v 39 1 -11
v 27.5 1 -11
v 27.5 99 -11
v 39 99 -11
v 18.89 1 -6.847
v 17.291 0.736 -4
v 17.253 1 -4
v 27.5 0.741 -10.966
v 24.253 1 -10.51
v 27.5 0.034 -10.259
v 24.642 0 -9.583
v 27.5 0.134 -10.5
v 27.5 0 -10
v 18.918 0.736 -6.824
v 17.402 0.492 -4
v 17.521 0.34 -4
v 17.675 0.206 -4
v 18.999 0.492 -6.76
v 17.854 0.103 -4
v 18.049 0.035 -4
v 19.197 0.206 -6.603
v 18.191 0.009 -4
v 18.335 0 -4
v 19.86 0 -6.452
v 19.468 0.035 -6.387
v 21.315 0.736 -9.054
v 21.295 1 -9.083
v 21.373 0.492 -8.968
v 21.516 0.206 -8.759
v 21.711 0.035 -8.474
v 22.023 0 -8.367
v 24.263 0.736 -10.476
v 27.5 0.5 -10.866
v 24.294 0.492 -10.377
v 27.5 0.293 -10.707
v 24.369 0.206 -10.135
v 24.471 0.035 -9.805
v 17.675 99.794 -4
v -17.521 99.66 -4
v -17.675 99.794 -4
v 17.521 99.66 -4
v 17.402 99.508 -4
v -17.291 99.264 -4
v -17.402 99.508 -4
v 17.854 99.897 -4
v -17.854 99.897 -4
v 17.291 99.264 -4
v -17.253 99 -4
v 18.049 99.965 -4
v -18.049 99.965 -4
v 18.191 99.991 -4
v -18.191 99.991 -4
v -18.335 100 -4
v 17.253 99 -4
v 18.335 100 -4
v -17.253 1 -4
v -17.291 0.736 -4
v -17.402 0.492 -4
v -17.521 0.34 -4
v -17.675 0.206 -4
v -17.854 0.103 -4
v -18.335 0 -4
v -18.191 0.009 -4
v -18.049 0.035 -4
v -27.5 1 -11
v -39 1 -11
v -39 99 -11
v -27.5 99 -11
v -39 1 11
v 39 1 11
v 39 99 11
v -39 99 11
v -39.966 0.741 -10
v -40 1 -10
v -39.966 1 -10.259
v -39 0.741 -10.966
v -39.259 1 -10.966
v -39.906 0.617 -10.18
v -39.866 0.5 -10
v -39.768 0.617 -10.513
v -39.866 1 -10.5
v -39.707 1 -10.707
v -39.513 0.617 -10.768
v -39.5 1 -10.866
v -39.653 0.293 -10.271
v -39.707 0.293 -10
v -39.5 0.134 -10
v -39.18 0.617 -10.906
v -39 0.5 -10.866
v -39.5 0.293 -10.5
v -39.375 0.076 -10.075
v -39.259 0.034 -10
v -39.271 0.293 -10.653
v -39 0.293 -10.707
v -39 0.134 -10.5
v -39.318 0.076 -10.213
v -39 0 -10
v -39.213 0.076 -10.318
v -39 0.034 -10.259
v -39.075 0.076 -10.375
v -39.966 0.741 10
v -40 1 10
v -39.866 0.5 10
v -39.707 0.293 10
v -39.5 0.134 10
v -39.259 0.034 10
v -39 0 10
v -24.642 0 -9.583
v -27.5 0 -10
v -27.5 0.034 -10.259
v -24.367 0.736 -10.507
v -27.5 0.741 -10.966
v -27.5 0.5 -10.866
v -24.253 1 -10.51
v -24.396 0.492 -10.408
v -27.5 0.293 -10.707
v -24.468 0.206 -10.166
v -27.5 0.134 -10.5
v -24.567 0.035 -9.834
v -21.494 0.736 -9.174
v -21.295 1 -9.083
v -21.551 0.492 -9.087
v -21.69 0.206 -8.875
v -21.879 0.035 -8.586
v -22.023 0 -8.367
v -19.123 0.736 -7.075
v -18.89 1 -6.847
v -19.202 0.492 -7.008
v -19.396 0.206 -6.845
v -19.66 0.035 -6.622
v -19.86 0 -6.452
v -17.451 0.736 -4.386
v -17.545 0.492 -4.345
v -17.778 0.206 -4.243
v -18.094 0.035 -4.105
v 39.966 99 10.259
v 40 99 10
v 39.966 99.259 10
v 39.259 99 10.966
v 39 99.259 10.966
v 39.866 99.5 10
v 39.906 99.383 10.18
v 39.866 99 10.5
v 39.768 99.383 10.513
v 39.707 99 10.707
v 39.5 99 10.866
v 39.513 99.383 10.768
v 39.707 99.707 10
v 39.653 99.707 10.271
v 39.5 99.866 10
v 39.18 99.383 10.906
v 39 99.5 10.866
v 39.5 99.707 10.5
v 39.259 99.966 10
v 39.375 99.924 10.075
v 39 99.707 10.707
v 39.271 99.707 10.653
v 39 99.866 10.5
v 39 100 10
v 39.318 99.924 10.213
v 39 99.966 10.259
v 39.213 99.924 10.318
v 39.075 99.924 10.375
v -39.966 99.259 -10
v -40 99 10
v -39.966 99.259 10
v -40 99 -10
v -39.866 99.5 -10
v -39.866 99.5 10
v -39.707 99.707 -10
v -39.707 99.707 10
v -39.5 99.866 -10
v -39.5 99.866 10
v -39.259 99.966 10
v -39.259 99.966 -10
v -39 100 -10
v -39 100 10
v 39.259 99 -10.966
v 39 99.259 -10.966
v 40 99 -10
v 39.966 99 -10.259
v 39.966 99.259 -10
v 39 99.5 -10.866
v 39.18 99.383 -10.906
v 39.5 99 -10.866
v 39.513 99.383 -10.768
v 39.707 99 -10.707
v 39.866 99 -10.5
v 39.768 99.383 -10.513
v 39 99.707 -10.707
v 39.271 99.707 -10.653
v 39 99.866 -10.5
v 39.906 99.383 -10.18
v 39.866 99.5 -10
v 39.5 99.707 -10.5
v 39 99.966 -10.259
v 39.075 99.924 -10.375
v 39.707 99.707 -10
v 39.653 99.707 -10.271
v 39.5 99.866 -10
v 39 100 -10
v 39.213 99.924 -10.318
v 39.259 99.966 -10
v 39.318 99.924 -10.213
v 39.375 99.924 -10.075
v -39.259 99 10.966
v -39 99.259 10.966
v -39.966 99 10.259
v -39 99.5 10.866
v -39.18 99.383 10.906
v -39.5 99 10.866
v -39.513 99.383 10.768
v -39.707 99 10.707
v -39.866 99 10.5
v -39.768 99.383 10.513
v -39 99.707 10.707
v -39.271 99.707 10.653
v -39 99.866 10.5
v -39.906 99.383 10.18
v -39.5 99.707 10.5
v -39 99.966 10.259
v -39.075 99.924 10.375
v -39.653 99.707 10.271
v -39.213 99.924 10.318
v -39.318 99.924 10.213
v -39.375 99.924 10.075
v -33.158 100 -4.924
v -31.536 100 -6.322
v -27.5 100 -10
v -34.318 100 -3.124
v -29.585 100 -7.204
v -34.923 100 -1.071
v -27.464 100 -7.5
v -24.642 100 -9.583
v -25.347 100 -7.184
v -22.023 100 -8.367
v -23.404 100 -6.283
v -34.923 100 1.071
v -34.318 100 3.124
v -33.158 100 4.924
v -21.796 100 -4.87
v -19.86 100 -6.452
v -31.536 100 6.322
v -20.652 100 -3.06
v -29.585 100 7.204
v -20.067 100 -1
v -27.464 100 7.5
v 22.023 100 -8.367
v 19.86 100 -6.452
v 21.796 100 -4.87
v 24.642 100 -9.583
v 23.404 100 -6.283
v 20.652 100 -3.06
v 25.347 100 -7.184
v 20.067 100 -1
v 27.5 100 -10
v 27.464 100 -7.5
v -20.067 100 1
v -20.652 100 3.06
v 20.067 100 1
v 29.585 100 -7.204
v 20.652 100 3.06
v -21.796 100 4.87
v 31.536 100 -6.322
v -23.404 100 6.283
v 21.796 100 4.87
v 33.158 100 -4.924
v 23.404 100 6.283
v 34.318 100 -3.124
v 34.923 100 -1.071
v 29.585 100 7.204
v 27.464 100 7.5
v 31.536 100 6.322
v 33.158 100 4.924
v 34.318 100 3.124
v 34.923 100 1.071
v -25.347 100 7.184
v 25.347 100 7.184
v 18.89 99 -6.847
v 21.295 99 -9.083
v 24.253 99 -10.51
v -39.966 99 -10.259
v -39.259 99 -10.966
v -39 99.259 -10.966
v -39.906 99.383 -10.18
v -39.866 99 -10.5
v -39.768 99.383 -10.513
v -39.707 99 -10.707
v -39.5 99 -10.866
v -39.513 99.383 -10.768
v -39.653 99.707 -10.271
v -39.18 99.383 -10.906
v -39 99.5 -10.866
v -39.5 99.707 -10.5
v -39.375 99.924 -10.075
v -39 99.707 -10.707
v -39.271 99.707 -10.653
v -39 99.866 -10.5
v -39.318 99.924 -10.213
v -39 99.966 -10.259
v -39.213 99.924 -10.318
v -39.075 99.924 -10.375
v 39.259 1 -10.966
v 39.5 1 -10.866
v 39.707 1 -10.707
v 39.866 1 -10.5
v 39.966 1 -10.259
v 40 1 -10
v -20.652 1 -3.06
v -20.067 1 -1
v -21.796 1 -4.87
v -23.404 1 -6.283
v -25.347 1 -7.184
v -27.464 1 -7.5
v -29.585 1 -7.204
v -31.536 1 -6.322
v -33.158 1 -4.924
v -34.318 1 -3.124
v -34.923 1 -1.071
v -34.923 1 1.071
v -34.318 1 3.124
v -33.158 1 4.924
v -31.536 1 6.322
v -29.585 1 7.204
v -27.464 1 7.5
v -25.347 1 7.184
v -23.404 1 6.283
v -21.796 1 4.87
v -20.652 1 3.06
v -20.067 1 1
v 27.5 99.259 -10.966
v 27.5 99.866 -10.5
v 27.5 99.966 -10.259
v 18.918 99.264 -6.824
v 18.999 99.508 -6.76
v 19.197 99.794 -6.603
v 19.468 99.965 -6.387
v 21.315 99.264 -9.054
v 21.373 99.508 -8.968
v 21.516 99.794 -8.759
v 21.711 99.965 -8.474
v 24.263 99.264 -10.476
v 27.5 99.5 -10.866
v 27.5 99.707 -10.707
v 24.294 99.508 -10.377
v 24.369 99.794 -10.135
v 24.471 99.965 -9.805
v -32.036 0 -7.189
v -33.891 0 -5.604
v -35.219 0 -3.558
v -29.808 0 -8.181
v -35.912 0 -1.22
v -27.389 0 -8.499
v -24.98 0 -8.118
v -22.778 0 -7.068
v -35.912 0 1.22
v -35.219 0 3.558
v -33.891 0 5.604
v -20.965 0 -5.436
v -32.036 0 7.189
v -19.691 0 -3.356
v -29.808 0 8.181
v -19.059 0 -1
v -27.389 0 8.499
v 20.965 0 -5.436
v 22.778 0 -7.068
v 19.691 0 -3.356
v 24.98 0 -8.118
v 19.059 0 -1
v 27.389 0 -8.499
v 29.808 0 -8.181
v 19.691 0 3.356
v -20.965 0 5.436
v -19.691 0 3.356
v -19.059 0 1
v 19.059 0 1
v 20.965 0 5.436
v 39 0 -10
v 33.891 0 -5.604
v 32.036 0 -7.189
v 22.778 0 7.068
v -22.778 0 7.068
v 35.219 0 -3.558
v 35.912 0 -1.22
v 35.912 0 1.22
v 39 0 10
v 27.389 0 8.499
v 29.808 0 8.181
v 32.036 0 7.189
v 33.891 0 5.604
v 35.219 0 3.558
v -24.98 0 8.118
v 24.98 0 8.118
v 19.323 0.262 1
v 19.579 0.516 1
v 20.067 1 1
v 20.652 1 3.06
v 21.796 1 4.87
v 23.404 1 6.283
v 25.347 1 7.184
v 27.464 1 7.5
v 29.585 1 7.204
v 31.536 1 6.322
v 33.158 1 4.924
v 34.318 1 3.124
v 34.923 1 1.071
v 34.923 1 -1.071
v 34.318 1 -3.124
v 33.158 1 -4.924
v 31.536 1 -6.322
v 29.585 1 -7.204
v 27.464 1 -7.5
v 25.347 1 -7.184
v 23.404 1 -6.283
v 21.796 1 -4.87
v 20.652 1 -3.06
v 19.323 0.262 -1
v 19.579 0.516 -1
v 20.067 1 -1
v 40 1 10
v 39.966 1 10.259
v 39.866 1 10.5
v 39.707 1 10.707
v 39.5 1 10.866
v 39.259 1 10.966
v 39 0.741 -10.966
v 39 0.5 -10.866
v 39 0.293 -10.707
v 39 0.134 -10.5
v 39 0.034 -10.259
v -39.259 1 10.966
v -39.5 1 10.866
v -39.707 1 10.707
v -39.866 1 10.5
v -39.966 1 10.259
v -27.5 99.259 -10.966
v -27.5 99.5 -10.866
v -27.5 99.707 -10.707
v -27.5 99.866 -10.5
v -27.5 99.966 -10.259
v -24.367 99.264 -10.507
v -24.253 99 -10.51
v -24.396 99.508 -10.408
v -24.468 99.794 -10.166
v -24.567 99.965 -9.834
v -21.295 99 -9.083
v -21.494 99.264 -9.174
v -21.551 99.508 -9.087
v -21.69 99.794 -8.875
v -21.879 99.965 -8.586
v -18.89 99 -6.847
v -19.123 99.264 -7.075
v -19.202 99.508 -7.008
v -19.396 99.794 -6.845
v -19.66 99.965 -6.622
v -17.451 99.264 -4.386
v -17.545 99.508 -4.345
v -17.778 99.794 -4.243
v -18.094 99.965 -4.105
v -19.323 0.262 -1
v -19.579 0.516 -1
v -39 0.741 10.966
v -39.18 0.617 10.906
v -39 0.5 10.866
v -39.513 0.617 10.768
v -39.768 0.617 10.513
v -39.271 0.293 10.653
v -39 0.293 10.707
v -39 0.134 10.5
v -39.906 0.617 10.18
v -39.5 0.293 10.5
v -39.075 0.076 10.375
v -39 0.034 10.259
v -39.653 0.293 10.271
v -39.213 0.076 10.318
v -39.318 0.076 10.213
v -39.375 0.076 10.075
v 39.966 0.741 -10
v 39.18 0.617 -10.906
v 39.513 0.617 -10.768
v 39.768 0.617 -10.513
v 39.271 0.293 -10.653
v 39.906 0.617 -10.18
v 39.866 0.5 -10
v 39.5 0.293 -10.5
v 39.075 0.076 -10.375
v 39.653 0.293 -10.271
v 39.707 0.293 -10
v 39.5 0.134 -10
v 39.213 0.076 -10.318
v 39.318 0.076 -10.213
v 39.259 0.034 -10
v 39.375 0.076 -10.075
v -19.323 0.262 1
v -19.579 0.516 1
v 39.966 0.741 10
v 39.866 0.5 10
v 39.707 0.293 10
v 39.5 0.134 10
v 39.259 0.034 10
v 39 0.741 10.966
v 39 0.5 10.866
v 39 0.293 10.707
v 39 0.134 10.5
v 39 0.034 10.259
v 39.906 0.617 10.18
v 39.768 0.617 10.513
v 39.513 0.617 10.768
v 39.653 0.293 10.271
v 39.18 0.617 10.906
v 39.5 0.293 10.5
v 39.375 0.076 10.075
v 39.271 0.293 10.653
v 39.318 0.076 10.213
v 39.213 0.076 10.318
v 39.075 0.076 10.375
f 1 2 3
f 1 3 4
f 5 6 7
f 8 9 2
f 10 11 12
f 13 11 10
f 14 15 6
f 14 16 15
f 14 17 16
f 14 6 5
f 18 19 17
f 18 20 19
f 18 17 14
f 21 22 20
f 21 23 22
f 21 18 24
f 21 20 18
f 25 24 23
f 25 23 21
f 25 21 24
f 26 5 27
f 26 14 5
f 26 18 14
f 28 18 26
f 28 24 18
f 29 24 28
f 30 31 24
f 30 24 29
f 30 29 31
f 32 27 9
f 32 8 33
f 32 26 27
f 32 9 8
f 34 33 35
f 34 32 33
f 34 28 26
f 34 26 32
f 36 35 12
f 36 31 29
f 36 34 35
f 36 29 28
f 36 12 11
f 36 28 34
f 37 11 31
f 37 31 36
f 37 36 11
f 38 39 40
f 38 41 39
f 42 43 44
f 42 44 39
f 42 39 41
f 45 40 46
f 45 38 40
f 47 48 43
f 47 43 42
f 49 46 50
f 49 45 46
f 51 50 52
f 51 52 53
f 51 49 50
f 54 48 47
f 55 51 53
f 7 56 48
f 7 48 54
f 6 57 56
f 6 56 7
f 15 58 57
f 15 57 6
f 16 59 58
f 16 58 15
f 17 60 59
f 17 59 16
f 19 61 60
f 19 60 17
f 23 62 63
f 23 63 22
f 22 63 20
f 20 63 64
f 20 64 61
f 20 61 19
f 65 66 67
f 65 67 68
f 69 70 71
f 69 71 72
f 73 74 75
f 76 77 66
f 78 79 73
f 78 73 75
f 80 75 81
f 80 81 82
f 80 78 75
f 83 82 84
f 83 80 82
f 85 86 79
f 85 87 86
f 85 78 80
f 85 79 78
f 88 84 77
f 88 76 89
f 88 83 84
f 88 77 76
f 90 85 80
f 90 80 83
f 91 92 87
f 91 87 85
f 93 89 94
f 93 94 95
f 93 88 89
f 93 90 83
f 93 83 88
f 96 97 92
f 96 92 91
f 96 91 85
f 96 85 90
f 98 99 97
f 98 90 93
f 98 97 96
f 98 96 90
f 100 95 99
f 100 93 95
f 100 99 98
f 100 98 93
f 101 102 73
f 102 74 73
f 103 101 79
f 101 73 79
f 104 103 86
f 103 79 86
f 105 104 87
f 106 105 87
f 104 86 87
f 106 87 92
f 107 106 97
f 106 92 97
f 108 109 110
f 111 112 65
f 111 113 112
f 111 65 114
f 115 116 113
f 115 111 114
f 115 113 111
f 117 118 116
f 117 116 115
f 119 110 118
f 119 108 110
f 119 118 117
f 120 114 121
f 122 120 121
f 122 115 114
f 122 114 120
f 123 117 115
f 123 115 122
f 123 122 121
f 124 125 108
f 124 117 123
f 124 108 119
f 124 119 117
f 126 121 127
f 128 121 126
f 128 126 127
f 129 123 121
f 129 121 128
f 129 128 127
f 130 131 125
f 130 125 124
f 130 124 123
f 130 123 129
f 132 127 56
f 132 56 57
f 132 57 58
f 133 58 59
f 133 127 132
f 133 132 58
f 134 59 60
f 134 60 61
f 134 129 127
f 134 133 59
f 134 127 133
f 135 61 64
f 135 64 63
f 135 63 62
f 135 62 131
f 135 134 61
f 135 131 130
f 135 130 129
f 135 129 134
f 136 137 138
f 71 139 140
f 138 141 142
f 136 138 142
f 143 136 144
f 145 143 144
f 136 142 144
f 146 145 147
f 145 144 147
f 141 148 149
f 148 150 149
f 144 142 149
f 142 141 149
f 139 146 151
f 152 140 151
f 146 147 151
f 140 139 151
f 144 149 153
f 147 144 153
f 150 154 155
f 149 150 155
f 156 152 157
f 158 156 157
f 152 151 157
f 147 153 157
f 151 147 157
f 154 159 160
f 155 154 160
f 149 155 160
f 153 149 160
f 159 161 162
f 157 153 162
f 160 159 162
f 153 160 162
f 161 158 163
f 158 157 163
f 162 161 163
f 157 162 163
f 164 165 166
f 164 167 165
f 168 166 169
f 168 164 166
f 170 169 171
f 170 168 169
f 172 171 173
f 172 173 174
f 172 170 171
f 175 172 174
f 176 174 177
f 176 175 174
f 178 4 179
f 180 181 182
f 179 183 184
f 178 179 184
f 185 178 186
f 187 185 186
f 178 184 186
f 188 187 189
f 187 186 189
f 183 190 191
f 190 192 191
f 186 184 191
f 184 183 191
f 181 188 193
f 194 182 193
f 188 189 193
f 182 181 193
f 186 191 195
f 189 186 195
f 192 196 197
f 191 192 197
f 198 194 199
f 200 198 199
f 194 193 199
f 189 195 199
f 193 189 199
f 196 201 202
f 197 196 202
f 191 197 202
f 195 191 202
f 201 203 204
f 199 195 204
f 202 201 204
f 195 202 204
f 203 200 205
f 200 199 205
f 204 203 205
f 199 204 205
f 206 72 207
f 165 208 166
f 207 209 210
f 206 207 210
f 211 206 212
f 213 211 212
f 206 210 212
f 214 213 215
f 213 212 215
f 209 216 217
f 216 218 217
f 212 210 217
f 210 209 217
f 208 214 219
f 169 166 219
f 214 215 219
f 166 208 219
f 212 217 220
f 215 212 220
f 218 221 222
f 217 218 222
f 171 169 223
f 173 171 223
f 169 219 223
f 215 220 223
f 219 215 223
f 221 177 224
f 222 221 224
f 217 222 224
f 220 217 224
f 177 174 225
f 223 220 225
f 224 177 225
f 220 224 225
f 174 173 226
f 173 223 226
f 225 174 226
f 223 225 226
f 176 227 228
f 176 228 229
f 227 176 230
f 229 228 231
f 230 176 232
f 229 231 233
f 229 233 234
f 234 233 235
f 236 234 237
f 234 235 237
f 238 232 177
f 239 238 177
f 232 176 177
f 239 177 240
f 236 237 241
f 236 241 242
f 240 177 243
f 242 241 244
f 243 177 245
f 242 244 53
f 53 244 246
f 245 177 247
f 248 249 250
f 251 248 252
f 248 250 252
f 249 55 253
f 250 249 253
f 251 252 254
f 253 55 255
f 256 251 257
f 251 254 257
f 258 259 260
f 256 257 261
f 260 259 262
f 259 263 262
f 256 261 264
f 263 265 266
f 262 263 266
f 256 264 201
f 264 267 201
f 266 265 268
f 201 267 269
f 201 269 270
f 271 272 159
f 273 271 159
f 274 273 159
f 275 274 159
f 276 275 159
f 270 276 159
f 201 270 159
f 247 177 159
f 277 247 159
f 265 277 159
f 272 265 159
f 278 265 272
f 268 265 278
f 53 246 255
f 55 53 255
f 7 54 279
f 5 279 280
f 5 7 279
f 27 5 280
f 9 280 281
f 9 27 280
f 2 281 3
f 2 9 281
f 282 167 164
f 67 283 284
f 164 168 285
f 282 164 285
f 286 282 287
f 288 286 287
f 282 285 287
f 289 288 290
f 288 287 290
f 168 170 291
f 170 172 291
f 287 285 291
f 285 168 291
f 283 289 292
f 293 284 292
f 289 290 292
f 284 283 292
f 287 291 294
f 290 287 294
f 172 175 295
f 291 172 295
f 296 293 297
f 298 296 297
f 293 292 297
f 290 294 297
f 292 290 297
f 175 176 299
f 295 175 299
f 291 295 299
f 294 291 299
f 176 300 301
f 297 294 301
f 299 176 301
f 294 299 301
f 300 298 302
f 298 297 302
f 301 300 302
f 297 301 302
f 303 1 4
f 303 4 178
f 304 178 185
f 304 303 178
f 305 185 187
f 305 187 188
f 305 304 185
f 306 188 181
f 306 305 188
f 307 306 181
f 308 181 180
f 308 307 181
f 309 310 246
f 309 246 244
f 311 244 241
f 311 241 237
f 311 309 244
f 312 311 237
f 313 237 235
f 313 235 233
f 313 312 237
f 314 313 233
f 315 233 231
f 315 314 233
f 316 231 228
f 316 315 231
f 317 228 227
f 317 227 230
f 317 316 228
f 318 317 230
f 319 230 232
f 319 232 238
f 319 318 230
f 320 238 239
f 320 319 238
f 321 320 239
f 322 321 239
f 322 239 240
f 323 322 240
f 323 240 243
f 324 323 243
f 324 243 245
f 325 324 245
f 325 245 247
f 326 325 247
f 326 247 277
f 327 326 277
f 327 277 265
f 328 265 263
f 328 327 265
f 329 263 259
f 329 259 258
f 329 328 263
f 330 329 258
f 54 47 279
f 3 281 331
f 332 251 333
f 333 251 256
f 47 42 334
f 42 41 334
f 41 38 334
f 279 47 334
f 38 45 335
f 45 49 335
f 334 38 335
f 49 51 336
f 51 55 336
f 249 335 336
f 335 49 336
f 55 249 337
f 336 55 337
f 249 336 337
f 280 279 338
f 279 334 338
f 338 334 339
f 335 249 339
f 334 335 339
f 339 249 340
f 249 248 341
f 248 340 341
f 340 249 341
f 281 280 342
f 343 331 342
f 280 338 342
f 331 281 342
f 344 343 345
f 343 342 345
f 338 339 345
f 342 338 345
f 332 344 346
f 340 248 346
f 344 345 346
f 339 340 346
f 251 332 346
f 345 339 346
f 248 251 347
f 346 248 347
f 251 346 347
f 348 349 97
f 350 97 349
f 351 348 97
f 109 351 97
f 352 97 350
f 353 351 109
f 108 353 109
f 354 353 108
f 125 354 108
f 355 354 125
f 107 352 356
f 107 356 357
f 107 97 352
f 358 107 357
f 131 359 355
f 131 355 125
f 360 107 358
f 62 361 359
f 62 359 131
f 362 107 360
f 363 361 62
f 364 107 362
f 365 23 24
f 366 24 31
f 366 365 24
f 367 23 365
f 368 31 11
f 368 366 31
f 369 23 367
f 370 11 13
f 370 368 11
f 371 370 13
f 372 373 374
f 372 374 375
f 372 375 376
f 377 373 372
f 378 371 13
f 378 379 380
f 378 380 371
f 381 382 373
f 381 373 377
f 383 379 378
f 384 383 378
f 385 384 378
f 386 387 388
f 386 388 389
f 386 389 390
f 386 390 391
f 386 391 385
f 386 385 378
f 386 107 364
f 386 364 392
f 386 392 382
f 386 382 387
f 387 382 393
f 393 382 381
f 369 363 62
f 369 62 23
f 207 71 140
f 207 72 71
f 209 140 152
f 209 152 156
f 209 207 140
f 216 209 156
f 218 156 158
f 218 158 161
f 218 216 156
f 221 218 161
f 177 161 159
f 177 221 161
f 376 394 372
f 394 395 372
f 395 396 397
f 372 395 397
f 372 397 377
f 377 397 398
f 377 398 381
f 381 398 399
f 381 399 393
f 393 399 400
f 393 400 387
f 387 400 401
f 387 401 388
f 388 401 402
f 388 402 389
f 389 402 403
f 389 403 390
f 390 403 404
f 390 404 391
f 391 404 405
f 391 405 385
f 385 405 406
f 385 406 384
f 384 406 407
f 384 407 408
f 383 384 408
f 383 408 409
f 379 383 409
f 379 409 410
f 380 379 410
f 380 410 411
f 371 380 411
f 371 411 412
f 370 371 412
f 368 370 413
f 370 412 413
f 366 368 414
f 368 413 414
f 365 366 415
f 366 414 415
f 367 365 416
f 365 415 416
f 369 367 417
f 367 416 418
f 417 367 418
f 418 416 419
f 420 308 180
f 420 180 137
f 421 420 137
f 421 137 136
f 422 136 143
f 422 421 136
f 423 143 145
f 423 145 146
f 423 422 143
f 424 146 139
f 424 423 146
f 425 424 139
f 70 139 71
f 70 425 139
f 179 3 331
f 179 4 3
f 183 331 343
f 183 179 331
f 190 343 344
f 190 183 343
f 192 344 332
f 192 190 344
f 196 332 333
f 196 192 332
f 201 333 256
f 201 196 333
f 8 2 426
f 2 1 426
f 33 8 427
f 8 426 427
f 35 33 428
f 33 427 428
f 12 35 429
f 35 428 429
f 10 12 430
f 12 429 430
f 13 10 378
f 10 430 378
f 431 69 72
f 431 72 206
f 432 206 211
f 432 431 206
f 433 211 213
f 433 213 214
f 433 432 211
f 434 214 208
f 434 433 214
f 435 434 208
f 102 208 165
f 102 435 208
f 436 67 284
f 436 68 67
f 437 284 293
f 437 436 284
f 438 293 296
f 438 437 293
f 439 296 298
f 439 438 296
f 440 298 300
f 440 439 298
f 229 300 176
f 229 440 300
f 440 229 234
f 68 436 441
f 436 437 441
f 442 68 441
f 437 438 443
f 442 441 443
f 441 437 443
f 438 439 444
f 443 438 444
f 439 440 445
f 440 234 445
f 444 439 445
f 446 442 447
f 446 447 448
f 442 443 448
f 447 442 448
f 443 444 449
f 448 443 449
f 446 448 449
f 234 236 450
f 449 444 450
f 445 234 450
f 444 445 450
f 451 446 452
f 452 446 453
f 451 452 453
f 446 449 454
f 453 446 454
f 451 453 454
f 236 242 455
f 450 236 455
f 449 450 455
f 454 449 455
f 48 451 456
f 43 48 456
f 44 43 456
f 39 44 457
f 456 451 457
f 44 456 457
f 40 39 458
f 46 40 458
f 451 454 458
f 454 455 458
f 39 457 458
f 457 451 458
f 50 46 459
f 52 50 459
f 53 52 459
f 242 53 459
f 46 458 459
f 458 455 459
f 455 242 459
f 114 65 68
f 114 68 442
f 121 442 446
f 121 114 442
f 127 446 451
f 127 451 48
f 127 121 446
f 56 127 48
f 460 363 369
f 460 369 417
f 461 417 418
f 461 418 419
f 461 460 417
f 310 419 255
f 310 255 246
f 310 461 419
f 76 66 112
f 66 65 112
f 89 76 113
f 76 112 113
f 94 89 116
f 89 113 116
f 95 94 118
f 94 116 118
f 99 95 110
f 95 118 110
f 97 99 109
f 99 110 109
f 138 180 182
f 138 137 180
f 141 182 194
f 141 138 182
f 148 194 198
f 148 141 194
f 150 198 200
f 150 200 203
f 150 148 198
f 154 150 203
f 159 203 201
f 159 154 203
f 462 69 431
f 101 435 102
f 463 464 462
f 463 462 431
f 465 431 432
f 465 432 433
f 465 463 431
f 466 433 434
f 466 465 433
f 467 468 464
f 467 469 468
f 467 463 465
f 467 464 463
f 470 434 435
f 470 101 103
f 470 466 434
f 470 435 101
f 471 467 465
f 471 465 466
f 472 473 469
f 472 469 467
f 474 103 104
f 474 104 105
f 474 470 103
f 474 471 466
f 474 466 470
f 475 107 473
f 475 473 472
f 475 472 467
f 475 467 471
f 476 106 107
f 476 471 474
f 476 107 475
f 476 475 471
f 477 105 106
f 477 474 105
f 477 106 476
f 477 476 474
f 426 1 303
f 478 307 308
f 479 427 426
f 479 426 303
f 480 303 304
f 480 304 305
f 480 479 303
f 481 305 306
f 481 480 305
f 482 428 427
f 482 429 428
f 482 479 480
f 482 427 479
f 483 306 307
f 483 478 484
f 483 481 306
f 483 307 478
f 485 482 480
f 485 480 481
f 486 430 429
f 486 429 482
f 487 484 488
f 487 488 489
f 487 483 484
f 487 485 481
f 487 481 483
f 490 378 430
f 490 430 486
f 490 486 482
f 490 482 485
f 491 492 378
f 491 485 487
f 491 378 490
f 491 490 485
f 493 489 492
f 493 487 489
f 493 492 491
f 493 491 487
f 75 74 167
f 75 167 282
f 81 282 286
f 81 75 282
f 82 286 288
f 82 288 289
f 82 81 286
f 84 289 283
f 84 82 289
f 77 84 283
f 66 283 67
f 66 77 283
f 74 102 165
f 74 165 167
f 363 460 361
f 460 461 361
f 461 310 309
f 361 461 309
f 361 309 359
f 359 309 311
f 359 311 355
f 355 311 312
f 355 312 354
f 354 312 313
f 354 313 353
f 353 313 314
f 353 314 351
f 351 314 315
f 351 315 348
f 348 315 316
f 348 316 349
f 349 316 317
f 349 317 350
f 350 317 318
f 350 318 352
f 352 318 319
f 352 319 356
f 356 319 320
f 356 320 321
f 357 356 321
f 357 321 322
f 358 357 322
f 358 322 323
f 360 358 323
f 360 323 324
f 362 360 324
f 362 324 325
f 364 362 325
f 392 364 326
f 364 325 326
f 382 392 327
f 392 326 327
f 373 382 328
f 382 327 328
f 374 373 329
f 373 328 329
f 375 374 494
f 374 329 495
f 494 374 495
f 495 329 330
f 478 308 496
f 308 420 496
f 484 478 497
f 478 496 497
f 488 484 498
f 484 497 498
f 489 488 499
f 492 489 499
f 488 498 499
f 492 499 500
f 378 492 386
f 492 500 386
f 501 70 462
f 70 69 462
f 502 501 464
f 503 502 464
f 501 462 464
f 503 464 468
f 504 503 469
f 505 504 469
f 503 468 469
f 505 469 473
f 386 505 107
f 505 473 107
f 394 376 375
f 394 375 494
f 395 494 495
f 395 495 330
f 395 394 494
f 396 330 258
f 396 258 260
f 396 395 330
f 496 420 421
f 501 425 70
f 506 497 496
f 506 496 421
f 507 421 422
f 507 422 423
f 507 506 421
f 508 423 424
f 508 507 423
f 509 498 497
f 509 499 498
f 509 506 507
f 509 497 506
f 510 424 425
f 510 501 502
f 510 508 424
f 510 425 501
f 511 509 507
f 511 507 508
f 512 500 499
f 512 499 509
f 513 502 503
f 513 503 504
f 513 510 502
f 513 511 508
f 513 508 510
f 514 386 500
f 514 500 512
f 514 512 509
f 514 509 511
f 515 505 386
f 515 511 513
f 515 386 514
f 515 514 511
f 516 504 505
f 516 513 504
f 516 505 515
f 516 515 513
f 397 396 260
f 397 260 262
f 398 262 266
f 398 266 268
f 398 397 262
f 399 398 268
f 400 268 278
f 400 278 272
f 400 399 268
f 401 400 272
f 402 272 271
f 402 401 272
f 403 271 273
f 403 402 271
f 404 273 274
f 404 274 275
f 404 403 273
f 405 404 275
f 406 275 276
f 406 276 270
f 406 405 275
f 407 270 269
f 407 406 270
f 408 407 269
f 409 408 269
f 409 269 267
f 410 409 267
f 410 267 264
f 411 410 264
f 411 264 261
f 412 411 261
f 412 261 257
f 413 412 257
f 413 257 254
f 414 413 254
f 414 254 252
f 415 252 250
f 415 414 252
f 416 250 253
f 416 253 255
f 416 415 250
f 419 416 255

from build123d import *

# Parameters (mm, degrees)
F1_DEPTH = 100
F2_R     = 1
F3_SIZE  = 1


with BuildPart() as f1:
    # F0 (on Front) → F1 (new body)
    with BuildSketch(Plane.XZ):
        with BuildLine():
            Line((39, 11), (-39, 11))
            ThreePointArc((-39, 11), (-39.7071067812, 10.7071067812), (-40, 10))
            Line((-40, 10), (-40, -10))
            ThreePointArc((-40, -10), (-39.7071067812, -10.7071067812), (-39, -11))
            Line((-39, -11), (-27.5, -11))
            ThreePointArc((-27.5, -11), (-21.295163177, -9.0829510623), (-17.253049234, -4))
            Line((-17.253049234, -4), (17.253049234, -4))
            ThreePointArc((17.253049234, -4), (21.295163177, -9.0829510623), (27.5, -11))
            Line((27.5, -11), (39, -11))
            ThreePointArc((39, -11), (39.7071067812, -10.7071067812), (40, -10))
            Line((40, -10), (40, 10))
            ThreePointArc((40, 10), (39.7071067812, 10.7071067812), (39, 11))
        make_face()
        with BuildLine():
            ThreePointArc((-20.0669656263, -1), (-35, 0), (-20.0669656263, 1))
            Line((-20.0669656263, 1), (20.0669656263, 1))
            ThreePointArc((20.0669656263, 1), (35, 0), (20.0669656263, -1))
            Line((20.0669656263, -1), (-20.0669656263, -1))
        make_face(mode=Mode.SUBTRACT)
    extrude(amount=-F1_DEPTH)

    # F2
    f2_edges = [f1.edges().sort_by_distance(p)[0] for p in [
        (39, 50, 11),
        (-39, 50, 11),
        (0, 0, 11),
        (0, 100, 11),
    ]]
    fillet(f2_edges, radius=F2_R)

    # F3
    f3_edges = [f1.edges().sort_by_distance(p)[0] for p in [
        (-35, 0, 0),
        (35, 0, 0),
    ]]
    chamfer(f3_edges, length=F3_SIZE)


solid = f1.part
